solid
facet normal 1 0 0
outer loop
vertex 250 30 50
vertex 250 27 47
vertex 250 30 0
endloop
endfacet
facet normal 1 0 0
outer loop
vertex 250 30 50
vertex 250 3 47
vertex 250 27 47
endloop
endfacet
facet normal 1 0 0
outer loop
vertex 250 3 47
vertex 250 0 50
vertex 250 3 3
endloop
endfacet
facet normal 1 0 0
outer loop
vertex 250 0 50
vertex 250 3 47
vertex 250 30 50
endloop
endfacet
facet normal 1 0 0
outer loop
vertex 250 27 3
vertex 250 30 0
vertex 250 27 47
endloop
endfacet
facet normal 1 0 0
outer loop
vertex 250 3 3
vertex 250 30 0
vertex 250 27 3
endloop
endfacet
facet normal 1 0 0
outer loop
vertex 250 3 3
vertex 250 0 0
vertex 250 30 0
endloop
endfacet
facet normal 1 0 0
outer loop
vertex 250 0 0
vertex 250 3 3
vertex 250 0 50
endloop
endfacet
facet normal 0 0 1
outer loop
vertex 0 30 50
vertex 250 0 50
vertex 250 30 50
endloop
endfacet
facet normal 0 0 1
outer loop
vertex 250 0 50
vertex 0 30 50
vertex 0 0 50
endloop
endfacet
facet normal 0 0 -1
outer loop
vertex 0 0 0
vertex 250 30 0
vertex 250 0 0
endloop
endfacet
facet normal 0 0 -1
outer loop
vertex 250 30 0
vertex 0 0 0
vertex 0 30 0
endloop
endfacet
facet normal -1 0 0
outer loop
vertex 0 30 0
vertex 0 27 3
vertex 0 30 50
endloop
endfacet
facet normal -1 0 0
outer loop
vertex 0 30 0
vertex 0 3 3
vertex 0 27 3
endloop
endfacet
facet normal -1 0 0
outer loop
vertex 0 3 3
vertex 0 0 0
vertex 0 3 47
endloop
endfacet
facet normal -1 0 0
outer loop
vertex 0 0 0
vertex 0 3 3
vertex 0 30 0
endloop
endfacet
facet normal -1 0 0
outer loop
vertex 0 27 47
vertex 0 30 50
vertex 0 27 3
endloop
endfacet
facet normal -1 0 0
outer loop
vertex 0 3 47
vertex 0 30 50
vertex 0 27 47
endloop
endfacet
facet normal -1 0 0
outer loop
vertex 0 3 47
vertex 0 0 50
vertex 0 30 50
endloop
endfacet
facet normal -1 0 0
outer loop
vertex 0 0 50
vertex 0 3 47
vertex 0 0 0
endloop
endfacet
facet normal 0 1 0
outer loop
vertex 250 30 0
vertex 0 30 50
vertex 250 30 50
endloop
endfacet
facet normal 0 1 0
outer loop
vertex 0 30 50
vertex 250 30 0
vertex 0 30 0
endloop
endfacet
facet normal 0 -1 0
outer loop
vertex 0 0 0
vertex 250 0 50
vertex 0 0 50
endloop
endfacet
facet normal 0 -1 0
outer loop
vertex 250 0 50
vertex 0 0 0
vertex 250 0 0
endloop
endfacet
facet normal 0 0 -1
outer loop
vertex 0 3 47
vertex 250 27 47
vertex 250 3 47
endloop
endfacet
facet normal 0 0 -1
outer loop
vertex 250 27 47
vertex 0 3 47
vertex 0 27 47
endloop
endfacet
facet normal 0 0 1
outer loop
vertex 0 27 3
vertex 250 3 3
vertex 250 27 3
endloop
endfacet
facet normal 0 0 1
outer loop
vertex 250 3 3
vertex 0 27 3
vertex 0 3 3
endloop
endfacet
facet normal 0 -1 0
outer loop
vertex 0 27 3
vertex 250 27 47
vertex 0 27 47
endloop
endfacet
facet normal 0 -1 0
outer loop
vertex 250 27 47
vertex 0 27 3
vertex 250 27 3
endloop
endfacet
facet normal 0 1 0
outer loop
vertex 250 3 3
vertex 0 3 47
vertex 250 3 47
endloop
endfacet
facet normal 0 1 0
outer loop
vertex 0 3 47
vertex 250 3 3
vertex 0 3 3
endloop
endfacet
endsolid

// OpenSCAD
$fn = 32;

// ----------------------------------------------------------------------
// Box beam: 200-250 mm hollow beam
// ----------------------------------------------------------------------

// --- parameters (mm) ---
beam_l = 250;             // beam length, X
beam_w = 30;              // beam width, Y
beam_h = 50;              // beam height, Z
wall = 3;                 // wall thickness

difference() {
  cube([beam_l, beam_w, beam_h]);
  translate([-1, wall, wall])
    cube([beam_l + 2, beam_w - 2 * wall, beam_h - 2 * wall]);
}
